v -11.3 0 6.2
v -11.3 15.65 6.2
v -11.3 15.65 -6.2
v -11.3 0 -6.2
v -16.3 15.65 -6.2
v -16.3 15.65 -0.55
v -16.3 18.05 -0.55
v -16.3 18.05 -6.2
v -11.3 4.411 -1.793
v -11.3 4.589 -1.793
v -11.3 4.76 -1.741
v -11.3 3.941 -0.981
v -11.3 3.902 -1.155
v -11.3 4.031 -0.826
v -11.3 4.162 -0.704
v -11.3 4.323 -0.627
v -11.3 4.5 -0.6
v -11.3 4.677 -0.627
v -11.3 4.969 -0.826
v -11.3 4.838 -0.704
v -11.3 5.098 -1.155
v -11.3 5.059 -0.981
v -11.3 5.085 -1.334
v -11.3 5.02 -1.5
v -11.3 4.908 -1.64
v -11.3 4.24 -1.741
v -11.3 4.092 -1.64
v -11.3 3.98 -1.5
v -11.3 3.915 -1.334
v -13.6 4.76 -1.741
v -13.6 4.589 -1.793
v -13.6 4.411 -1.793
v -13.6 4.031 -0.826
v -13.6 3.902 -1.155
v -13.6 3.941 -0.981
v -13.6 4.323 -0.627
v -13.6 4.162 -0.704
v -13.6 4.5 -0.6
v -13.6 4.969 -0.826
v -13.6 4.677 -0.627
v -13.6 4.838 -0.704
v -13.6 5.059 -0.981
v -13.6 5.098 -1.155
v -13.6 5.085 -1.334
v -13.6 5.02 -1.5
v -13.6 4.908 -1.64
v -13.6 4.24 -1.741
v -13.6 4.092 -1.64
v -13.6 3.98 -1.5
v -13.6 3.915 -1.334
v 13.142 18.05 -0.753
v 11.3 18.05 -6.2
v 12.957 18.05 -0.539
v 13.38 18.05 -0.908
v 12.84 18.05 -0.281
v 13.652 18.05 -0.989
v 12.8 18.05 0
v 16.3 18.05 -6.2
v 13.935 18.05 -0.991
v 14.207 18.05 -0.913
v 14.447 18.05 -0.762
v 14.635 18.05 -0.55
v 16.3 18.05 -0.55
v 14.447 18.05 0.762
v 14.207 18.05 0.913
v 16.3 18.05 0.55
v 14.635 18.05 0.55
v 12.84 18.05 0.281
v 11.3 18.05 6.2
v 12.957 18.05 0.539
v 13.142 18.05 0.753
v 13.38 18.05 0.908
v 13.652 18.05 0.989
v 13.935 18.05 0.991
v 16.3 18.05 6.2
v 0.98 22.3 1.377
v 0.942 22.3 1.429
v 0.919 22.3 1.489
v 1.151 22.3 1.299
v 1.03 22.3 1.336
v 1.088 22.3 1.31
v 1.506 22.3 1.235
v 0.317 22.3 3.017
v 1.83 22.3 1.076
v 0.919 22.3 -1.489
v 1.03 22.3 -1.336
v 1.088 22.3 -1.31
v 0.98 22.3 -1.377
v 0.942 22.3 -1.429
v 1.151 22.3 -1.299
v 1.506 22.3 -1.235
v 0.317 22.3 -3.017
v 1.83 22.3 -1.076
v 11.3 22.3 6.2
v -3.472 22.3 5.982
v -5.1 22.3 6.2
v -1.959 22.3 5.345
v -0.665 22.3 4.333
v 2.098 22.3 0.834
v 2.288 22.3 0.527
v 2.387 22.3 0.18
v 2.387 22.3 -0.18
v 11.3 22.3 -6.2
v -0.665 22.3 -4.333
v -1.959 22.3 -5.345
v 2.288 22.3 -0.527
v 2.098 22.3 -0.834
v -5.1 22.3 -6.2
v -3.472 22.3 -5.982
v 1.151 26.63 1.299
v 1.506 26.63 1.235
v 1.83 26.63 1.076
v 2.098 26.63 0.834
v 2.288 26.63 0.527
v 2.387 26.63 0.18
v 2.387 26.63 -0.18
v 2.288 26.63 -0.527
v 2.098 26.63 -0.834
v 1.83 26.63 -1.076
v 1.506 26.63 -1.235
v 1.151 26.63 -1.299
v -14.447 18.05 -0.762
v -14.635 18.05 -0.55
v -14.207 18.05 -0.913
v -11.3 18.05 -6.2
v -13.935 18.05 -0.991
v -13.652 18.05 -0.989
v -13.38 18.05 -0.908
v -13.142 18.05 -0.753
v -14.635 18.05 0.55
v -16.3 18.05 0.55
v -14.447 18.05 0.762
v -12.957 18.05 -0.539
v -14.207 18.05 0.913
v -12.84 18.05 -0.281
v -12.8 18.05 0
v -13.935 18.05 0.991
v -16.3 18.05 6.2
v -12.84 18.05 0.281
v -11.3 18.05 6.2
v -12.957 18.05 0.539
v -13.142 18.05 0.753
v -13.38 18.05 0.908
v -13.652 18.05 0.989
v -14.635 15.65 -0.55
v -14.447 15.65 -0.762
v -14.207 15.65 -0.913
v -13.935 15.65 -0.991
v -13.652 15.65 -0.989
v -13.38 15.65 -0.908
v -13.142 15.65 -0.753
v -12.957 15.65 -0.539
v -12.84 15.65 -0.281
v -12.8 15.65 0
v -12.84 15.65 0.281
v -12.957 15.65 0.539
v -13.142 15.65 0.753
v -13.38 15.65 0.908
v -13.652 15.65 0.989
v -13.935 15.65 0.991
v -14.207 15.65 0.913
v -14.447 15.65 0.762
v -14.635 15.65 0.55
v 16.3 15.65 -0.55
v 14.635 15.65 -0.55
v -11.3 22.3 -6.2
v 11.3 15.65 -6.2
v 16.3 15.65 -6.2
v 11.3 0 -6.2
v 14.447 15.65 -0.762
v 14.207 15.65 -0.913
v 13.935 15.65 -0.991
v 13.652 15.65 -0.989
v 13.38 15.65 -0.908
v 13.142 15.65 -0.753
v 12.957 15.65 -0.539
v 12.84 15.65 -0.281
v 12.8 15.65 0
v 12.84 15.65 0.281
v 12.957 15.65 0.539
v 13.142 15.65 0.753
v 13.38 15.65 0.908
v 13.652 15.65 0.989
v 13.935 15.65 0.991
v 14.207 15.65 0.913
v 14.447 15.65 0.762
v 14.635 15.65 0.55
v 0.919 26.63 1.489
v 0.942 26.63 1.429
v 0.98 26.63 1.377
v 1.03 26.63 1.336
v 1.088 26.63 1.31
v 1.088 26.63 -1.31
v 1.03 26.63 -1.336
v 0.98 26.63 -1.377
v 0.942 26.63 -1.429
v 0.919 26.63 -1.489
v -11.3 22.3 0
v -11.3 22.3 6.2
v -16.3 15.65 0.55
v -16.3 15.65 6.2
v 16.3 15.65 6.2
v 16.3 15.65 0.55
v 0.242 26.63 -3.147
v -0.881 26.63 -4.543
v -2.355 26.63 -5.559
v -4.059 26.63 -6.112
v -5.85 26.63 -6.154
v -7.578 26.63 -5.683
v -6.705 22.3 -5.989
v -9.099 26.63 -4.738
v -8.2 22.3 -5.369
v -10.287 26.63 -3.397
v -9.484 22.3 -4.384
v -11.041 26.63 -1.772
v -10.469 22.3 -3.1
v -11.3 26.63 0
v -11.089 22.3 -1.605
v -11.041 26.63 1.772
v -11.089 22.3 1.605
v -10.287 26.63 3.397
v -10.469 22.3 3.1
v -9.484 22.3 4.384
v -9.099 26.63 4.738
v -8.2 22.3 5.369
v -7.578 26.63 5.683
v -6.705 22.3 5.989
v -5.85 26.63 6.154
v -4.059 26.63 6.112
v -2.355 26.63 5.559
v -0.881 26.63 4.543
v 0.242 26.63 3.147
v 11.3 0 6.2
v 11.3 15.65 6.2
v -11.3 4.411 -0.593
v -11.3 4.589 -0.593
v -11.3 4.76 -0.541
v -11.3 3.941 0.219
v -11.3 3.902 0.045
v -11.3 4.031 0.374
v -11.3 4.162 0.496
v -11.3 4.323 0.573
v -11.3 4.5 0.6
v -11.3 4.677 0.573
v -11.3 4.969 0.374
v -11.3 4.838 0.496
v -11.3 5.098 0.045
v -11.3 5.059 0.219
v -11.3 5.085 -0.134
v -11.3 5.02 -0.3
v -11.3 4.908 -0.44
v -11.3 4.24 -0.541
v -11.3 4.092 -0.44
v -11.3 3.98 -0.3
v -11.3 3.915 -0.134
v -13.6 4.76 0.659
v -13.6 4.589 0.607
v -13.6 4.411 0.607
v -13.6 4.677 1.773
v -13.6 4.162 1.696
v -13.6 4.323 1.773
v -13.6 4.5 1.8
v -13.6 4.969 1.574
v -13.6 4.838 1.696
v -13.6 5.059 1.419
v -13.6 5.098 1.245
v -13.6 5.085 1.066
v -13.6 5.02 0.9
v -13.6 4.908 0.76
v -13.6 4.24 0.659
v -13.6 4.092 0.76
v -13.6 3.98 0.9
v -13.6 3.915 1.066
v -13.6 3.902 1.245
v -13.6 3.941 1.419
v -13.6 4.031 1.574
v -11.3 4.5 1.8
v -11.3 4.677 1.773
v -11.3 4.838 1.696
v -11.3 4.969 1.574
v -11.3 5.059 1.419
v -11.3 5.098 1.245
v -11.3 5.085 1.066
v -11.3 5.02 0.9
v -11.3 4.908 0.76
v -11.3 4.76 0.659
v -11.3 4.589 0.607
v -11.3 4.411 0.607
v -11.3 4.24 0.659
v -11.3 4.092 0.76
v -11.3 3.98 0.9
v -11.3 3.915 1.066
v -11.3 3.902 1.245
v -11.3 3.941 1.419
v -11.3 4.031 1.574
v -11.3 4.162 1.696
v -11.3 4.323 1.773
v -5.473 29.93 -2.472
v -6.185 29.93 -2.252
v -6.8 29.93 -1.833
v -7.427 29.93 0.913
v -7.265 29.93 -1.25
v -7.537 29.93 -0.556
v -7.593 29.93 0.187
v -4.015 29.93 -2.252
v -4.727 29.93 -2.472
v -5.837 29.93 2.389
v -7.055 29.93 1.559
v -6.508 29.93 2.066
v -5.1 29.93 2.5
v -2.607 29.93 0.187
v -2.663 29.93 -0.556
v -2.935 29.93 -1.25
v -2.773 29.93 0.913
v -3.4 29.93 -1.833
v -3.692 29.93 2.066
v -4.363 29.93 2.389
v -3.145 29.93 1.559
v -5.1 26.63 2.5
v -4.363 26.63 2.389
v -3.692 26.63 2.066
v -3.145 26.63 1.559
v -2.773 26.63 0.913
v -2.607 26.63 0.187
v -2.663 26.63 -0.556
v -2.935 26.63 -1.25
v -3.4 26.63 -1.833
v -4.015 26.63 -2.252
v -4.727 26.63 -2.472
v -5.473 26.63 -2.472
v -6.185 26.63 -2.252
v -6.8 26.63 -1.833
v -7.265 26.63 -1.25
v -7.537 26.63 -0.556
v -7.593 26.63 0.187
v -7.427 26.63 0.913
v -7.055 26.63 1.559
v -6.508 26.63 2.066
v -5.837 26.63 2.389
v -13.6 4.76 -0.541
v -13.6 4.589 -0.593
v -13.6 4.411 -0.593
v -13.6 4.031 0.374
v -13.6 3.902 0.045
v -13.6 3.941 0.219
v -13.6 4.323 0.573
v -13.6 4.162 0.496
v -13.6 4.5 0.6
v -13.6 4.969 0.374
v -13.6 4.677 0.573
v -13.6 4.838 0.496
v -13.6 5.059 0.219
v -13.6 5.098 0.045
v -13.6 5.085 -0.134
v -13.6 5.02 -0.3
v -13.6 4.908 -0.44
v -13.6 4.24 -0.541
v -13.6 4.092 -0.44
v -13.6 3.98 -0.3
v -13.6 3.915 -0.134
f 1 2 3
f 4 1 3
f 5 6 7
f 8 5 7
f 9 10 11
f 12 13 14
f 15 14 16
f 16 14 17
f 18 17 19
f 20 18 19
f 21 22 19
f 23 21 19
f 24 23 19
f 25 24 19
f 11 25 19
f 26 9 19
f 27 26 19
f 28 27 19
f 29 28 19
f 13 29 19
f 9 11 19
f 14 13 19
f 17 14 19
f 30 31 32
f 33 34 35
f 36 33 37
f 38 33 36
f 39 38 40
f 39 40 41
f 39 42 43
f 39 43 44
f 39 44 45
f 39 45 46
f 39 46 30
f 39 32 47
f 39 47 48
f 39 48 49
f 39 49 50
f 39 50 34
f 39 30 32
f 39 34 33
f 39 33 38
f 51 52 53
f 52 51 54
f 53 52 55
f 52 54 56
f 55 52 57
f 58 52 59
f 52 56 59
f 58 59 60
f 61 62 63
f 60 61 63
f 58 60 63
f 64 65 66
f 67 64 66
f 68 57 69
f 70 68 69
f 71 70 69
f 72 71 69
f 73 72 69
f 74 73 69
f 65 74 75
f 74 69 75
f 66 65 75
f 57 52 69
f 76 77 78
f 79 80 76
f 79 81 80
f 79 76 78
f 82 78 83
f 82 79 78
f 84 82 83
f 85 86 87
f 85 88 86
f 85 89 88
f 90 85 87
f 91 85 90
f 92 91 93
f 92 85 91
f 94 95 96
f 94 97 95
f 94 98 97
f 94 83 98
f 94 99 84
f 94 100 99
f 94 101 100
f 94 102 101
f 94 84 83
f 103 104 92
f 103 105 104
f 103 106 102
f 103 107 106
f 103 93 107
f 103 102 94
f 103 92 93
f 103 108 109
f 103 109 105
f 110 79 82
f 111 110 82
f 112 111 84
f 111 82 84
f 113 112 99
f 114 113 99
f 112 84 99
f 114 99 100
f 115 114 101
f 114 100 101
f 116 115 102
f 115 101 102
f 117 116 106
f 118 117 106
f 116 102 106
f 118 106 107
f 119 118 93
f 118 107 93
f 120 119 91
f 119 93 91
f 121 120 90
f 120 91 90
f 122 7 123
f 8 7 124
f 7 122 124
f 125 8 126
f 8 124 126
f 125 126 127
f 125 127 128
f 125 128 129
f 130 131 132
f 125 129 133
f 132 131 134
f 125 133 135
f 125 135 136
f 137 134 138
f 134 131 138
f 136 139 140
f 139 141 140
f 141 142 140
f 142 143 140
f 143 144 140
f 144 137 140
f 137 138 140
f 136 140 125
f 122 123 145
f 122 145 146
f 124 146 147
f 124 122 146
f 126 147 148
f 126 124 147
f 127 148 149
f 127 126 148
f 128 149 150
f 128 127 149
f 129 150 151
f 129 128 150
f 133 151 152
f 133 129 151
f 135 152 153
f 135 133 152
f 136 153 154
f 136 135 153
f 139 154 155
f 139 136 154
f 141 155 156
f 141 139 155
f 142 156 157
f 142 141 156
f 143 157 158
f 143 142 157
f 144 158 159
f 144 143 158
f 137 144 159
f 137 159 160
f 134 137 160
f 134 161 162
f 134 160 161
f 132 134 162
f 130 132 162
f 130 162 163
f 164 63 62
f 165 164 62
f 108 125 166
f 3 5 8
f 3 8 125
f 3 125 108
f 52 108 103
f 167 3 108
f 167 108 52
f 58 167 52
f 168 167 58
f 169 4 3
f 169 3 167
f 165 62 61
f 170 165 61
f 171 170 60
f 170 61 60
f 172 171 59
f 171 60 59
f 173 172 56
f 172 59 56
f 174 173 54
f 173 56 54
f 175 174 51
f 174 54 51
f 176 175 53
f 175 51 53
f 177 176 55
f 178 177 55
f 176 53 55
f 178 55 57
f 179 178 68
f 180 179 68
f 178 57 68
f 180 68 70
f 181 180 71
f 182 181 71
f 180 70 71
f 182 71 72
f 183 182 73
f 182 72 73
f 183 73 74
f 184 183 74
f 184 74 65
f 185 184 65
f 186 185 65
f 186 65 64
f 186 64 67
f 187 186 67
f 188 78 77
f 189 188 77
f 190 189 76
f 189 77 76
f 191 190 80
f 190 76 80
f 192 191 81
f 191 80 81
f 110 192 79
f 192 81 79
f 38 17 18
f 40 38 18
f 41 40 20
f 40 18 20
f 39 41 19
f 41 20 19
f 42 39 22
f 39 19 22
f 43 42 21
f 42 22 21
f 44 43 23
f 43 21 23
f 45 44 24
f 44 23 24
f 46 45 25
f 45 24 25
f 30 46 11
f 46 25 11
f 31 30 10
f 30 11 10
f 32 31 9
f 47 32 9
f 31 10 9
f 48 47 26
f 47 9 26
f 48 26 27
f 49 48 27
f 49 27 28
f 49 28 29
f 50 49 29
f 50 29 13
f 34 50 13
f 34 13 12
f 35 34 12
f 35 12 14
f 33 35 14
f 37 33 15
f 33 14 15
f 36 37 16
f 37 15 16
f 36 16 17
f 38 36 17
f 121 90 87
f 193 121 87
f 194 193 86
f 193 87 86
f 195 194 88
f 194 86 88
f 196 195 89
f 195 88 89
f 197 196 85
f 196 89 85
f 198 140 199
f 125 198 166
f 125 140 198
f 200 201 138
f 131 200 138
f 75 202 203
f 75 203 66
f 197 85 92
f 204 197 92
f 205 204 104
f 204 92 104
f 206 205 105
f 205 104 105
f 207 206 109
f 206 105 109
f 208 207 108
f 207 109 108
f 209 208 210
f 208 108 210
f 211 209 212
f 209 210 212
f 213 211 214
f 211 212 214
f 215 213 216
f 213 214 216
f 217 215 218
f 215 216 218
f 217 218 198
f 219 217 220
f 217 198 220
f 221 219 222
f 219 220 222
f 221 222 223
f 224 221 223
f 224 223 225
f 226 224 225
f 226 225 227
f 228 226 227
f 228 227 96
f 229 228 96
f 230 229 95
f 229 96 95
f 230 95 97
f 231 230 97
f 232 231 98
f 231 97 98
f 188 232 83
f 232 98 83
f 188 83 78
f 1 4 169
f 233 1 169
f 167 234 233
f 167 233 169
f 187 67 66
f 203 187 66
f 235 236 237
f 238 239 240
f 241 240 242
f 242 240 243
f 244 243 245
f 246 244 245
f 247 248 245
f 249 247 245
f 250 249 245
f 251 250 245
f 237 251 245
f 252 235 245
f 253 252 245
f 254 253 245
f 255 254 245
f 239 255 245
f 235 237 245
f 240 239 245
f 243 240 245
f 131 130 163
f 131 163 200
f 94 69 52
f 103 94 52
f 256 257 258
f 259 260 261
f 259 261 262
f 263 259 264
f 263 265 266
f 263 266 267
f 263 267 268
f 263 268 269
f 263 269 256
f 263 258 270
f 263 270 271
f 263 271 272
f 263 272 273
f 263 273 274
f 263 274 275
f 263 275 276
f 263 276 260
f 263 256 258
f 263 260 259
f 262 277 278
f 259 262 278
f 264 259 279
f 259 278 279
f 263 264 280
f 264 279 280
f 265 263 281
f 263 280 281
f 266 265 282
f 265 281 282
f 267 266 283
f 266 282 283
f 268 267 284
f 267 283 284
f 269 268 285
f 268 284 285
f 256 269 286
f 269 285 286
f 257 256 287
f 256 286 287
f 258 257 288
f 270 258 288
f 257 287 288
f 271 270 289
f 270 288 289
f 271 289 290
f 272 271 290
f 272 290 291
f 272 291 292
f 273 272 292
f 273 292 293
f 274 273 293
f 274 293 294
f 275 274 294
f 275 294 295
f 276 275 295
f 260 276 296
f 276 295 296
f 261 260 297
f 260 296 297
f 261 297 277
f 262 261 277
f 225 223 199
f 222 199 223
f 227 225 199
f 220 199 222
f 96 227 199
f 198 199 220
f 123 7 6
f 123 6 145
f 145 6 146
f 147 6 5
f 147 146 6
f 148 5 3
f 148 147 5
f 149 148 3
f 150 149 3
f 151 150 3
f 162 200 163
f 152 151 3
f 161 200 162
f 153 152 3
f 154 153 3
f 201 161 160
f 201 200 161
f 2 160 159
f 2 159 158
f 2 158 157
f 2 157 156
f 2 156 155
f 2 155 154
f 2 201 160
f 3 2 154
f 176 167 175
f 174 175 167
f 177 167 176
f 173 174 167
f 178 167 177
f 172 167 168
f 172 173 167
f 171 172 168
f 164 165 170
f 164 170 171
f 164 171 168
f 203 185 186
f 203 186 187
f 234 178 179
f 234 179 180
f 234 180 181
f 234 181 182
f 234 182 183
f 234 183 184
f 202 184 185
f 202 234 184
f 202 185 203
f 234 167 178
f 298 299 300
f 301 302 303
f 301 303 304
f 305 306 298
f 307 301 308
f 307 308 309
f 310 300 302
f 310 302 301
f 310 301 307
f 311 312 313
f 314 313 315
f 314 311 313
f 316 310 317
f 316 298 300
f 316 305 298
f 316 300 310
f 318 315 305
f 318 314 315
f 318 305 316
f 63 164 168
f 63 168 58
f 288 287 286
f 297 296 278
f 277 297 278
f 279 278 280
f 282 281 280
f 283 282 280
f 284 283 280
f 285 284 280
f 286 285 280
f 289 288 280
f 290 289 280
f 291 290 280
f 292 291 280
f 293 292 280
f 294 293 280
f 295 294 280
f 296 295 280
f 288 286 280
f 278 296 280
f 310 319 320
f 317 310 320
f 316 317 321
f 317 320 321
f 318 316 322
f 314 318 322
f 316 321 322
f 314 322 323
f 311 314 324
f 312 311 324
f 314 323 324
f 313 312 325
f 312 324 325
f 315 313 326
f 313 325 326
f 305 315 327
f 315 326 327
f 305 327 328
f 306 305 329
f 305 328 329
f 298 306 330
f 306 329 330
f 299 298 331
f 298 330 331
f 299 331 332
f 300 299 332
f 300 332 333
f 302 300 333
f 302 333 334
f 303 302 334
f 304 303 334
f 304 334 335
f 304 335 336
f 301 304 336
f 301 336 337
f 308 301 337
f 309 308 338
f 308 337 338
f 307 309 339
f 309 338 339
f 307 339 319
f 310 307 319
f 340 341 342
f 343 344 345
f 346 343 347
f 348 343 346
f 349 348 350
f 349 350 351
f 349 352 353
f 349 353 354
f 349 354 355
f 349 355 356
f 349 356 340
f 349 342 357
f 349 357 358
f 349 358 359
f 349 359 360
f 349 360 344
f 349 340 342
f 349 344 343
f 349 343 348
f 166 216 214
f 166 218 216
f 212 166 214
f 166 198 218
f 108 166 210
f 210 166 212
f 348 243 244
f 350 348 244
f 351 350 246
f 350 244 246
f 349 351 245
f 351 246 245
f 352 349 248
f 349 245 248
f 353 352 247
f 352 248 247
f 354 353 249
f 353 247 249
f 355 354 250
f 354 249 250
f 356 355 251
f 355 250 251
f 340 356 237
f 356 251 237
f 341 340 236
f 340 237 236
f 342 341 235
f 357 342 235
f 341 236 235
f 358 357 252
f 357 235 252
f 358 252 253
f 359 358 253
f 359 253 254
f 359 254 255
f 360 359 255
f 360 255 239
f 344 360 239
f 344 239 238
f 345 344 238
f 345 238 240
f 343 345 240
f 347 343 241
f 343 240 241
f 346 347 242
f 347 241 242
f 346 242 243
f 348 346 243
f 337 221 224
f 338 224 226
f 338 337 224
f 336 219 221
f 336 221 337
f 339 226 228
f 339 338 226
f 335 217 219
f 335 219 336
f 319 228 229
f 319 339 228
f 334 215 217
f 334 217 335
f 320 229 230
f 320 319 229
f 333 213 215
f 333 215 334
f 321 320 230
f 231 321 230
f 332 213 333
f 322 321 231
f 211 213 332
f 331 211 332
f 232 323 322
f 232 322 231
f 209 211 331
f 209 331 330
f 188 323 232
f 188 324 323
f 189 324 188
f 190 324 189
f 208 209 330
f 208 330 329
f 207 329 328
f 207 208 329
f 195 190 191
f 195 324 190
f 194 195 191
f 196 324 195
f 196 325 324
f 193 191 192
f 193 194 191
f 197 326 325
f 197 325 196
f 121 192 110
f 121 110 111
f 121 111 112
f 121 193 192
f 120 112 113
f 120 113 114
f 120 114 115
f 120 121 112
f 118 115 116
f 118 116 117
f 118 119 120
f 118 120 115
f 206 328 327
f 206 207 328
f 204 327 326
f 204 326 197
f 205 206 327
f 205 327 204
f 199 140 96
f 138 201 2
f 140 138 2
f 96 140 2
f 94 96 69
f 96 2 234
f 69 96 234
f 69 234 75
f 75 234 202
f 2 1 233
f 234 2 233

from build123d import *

# Parameters (mm, degrees)
SKETCH1_W             = 22.6
SKETCH1_H             = 12.4
BOSS_EXTRUDE1_DEPTH   = 22.3
SKETCH2_W             = 5
SKETCH2_H             = 2.4
BOSS_EXTRUDE2_DEPTH   = 12.4
CUT_EXTRUDE_S_DEPTH   = 26.098456128
BOSS_EXTRUDE3_DEPTH   = 4.33
SKETCH5_R             = 2.5
BOSS_EXTRUDE4_DEPTH   = 3.3
SKETCH6_R             = 0.6
BOSS_EXTRUDE6_DEPTH   = 2.3
BOSS_EXTRUDE6_2_DEPTH = 2.3
BOSS_EXTRUDE6_3_DEPTH = 2.3


with BuildPart() as part:
    # Sketch1 → Boss-Extrude1 (new body)
    with BuildSketch(Plane(origin=(0, 0, 0), x_dir=(1, 0, 0), z_dir=(0, 1, 0))):
        Rectangle(SKETCH1_W, SKETCH1_H)
    extrude(amount=BOSS_EXTRUDE1_DEPTH)

    # Sketch2 → Boss-Extrude2 (add)
    with BuildSketch(Plane.XY.offset(6.2)):
        with Locations((13.8, 16.85)):
            Rectangle(SKETCH2_W, SKETCH2_H)
        with Locations((-13.8, 16.85)):
            Rectangle(SKETCH2_W, SKETCH2_H)
    extrude(amount=-BOSS_EXTRUDE2_DEPTH)

    # Sketch3 → Cut-Extrude s (cut, through all)
    with BuildSketch(Plane(origin=(0, 18.05, 0), x_dir=(1, 0, 0), z_dir=(0, 1, 0))):
        with BuildLine():
            Line((16.3, 0.55), (14.635164654, 0.55))
            ThreePointArc((14.635164654, 0.55), (12.8, 0), (14.635164654, -0.55))
            Line((14.635164654, -0.55), (16.3, -0.55))
            Line((16.3, -0.55), (16.3, 0.55))
        make_face()
    cut_extrude_s = extrude(amount=-CUT_EXTRUDE_S_DEPTH, mode=Mode.SUBTRACT)

    # Mirror1: Cut-Extrude s across plane
    add(cut_extrude_s.mirror(Plane(origin=(0, 0, 0), x_dir=(0, 0, 1), z_dir=(1, 0, 0))), mode=Mode.SUBTRACT)

    # Sketch4 → Boss-Extrude3 (add)
    with BuildSketch(Plane(origin=(0, 22.3, 0), x_dir=(1, 0, 0), z_dir=(0, 1, 0))):
        with BuildLine():
            ThreePointArc((0.918604651, 1.488757218), (-11.3, 0), (0.918604651, -1.488757218))
            ThreePointArc((0.918604651, -1.488757218), (1.003329596, -1.355013632), (1.151404787, -1.298983275))
            ThreePointArc((1.151404787, -1.298983275), (2.4, 0), (1.151404787, 1.298983275))
            ThreePointArc((1.151404787, 1.298983275), (1.003329596, 1.355013632), (0.918604651, 1.488757218))
        make_face()
    extrude(amount=BOSS_EXTRUDE3_DEPTH)

    # Sketch5 → Boss-Extrude4 (add)
    with BuildSketch(Plane(origin=(0, 26.63, 0), x_dir=(1, 0, 0), z_dir=(0, 1, 0))):
        with Locations(Location((-5.1, 0, 0), (0, 0, 270))):
            Circle(SKETCH5_R)
    extrude(amount=BOSS_EXTRUDE4_DEPTH)


with BuildPart() as body_2:
    # Sketch6 → Boss-Extrude6 (new body)
    with BuildSketch(Plane.ZY.offset(11.3)):
        with Locations((1.2, 4.5)):
            Circle(SKETCH6_R)
    extrude(amount=BOSS_EXTRUDE6_DEPTH)


with BuildPart() as body_3:
    # Sketch6 → Boss-Extrude6 2 (new body)
    with BuildSketch(Plane.ZY.offset(11.3)):
        with Locations((0, 4.5)):
            Circle(SKETCH6_R)
    extrude(amount=BOSS_EXTRUDE6_2_DEPTH)


with BuildPart() as body_4:
    # Sketch6 → Boss-Extrude6 3 (new body)
    with BuildSketch(Plane.ZY.offset(11.3)):
        with Locations((-1.2, 4.5)):
            Circle(SKETCH6_R)
    extrude(amount=BOSS_EXTRUDE6_3_DEPTH)


solid = Compound([part.part, body_2.part, body_3.part, body_4.part])
